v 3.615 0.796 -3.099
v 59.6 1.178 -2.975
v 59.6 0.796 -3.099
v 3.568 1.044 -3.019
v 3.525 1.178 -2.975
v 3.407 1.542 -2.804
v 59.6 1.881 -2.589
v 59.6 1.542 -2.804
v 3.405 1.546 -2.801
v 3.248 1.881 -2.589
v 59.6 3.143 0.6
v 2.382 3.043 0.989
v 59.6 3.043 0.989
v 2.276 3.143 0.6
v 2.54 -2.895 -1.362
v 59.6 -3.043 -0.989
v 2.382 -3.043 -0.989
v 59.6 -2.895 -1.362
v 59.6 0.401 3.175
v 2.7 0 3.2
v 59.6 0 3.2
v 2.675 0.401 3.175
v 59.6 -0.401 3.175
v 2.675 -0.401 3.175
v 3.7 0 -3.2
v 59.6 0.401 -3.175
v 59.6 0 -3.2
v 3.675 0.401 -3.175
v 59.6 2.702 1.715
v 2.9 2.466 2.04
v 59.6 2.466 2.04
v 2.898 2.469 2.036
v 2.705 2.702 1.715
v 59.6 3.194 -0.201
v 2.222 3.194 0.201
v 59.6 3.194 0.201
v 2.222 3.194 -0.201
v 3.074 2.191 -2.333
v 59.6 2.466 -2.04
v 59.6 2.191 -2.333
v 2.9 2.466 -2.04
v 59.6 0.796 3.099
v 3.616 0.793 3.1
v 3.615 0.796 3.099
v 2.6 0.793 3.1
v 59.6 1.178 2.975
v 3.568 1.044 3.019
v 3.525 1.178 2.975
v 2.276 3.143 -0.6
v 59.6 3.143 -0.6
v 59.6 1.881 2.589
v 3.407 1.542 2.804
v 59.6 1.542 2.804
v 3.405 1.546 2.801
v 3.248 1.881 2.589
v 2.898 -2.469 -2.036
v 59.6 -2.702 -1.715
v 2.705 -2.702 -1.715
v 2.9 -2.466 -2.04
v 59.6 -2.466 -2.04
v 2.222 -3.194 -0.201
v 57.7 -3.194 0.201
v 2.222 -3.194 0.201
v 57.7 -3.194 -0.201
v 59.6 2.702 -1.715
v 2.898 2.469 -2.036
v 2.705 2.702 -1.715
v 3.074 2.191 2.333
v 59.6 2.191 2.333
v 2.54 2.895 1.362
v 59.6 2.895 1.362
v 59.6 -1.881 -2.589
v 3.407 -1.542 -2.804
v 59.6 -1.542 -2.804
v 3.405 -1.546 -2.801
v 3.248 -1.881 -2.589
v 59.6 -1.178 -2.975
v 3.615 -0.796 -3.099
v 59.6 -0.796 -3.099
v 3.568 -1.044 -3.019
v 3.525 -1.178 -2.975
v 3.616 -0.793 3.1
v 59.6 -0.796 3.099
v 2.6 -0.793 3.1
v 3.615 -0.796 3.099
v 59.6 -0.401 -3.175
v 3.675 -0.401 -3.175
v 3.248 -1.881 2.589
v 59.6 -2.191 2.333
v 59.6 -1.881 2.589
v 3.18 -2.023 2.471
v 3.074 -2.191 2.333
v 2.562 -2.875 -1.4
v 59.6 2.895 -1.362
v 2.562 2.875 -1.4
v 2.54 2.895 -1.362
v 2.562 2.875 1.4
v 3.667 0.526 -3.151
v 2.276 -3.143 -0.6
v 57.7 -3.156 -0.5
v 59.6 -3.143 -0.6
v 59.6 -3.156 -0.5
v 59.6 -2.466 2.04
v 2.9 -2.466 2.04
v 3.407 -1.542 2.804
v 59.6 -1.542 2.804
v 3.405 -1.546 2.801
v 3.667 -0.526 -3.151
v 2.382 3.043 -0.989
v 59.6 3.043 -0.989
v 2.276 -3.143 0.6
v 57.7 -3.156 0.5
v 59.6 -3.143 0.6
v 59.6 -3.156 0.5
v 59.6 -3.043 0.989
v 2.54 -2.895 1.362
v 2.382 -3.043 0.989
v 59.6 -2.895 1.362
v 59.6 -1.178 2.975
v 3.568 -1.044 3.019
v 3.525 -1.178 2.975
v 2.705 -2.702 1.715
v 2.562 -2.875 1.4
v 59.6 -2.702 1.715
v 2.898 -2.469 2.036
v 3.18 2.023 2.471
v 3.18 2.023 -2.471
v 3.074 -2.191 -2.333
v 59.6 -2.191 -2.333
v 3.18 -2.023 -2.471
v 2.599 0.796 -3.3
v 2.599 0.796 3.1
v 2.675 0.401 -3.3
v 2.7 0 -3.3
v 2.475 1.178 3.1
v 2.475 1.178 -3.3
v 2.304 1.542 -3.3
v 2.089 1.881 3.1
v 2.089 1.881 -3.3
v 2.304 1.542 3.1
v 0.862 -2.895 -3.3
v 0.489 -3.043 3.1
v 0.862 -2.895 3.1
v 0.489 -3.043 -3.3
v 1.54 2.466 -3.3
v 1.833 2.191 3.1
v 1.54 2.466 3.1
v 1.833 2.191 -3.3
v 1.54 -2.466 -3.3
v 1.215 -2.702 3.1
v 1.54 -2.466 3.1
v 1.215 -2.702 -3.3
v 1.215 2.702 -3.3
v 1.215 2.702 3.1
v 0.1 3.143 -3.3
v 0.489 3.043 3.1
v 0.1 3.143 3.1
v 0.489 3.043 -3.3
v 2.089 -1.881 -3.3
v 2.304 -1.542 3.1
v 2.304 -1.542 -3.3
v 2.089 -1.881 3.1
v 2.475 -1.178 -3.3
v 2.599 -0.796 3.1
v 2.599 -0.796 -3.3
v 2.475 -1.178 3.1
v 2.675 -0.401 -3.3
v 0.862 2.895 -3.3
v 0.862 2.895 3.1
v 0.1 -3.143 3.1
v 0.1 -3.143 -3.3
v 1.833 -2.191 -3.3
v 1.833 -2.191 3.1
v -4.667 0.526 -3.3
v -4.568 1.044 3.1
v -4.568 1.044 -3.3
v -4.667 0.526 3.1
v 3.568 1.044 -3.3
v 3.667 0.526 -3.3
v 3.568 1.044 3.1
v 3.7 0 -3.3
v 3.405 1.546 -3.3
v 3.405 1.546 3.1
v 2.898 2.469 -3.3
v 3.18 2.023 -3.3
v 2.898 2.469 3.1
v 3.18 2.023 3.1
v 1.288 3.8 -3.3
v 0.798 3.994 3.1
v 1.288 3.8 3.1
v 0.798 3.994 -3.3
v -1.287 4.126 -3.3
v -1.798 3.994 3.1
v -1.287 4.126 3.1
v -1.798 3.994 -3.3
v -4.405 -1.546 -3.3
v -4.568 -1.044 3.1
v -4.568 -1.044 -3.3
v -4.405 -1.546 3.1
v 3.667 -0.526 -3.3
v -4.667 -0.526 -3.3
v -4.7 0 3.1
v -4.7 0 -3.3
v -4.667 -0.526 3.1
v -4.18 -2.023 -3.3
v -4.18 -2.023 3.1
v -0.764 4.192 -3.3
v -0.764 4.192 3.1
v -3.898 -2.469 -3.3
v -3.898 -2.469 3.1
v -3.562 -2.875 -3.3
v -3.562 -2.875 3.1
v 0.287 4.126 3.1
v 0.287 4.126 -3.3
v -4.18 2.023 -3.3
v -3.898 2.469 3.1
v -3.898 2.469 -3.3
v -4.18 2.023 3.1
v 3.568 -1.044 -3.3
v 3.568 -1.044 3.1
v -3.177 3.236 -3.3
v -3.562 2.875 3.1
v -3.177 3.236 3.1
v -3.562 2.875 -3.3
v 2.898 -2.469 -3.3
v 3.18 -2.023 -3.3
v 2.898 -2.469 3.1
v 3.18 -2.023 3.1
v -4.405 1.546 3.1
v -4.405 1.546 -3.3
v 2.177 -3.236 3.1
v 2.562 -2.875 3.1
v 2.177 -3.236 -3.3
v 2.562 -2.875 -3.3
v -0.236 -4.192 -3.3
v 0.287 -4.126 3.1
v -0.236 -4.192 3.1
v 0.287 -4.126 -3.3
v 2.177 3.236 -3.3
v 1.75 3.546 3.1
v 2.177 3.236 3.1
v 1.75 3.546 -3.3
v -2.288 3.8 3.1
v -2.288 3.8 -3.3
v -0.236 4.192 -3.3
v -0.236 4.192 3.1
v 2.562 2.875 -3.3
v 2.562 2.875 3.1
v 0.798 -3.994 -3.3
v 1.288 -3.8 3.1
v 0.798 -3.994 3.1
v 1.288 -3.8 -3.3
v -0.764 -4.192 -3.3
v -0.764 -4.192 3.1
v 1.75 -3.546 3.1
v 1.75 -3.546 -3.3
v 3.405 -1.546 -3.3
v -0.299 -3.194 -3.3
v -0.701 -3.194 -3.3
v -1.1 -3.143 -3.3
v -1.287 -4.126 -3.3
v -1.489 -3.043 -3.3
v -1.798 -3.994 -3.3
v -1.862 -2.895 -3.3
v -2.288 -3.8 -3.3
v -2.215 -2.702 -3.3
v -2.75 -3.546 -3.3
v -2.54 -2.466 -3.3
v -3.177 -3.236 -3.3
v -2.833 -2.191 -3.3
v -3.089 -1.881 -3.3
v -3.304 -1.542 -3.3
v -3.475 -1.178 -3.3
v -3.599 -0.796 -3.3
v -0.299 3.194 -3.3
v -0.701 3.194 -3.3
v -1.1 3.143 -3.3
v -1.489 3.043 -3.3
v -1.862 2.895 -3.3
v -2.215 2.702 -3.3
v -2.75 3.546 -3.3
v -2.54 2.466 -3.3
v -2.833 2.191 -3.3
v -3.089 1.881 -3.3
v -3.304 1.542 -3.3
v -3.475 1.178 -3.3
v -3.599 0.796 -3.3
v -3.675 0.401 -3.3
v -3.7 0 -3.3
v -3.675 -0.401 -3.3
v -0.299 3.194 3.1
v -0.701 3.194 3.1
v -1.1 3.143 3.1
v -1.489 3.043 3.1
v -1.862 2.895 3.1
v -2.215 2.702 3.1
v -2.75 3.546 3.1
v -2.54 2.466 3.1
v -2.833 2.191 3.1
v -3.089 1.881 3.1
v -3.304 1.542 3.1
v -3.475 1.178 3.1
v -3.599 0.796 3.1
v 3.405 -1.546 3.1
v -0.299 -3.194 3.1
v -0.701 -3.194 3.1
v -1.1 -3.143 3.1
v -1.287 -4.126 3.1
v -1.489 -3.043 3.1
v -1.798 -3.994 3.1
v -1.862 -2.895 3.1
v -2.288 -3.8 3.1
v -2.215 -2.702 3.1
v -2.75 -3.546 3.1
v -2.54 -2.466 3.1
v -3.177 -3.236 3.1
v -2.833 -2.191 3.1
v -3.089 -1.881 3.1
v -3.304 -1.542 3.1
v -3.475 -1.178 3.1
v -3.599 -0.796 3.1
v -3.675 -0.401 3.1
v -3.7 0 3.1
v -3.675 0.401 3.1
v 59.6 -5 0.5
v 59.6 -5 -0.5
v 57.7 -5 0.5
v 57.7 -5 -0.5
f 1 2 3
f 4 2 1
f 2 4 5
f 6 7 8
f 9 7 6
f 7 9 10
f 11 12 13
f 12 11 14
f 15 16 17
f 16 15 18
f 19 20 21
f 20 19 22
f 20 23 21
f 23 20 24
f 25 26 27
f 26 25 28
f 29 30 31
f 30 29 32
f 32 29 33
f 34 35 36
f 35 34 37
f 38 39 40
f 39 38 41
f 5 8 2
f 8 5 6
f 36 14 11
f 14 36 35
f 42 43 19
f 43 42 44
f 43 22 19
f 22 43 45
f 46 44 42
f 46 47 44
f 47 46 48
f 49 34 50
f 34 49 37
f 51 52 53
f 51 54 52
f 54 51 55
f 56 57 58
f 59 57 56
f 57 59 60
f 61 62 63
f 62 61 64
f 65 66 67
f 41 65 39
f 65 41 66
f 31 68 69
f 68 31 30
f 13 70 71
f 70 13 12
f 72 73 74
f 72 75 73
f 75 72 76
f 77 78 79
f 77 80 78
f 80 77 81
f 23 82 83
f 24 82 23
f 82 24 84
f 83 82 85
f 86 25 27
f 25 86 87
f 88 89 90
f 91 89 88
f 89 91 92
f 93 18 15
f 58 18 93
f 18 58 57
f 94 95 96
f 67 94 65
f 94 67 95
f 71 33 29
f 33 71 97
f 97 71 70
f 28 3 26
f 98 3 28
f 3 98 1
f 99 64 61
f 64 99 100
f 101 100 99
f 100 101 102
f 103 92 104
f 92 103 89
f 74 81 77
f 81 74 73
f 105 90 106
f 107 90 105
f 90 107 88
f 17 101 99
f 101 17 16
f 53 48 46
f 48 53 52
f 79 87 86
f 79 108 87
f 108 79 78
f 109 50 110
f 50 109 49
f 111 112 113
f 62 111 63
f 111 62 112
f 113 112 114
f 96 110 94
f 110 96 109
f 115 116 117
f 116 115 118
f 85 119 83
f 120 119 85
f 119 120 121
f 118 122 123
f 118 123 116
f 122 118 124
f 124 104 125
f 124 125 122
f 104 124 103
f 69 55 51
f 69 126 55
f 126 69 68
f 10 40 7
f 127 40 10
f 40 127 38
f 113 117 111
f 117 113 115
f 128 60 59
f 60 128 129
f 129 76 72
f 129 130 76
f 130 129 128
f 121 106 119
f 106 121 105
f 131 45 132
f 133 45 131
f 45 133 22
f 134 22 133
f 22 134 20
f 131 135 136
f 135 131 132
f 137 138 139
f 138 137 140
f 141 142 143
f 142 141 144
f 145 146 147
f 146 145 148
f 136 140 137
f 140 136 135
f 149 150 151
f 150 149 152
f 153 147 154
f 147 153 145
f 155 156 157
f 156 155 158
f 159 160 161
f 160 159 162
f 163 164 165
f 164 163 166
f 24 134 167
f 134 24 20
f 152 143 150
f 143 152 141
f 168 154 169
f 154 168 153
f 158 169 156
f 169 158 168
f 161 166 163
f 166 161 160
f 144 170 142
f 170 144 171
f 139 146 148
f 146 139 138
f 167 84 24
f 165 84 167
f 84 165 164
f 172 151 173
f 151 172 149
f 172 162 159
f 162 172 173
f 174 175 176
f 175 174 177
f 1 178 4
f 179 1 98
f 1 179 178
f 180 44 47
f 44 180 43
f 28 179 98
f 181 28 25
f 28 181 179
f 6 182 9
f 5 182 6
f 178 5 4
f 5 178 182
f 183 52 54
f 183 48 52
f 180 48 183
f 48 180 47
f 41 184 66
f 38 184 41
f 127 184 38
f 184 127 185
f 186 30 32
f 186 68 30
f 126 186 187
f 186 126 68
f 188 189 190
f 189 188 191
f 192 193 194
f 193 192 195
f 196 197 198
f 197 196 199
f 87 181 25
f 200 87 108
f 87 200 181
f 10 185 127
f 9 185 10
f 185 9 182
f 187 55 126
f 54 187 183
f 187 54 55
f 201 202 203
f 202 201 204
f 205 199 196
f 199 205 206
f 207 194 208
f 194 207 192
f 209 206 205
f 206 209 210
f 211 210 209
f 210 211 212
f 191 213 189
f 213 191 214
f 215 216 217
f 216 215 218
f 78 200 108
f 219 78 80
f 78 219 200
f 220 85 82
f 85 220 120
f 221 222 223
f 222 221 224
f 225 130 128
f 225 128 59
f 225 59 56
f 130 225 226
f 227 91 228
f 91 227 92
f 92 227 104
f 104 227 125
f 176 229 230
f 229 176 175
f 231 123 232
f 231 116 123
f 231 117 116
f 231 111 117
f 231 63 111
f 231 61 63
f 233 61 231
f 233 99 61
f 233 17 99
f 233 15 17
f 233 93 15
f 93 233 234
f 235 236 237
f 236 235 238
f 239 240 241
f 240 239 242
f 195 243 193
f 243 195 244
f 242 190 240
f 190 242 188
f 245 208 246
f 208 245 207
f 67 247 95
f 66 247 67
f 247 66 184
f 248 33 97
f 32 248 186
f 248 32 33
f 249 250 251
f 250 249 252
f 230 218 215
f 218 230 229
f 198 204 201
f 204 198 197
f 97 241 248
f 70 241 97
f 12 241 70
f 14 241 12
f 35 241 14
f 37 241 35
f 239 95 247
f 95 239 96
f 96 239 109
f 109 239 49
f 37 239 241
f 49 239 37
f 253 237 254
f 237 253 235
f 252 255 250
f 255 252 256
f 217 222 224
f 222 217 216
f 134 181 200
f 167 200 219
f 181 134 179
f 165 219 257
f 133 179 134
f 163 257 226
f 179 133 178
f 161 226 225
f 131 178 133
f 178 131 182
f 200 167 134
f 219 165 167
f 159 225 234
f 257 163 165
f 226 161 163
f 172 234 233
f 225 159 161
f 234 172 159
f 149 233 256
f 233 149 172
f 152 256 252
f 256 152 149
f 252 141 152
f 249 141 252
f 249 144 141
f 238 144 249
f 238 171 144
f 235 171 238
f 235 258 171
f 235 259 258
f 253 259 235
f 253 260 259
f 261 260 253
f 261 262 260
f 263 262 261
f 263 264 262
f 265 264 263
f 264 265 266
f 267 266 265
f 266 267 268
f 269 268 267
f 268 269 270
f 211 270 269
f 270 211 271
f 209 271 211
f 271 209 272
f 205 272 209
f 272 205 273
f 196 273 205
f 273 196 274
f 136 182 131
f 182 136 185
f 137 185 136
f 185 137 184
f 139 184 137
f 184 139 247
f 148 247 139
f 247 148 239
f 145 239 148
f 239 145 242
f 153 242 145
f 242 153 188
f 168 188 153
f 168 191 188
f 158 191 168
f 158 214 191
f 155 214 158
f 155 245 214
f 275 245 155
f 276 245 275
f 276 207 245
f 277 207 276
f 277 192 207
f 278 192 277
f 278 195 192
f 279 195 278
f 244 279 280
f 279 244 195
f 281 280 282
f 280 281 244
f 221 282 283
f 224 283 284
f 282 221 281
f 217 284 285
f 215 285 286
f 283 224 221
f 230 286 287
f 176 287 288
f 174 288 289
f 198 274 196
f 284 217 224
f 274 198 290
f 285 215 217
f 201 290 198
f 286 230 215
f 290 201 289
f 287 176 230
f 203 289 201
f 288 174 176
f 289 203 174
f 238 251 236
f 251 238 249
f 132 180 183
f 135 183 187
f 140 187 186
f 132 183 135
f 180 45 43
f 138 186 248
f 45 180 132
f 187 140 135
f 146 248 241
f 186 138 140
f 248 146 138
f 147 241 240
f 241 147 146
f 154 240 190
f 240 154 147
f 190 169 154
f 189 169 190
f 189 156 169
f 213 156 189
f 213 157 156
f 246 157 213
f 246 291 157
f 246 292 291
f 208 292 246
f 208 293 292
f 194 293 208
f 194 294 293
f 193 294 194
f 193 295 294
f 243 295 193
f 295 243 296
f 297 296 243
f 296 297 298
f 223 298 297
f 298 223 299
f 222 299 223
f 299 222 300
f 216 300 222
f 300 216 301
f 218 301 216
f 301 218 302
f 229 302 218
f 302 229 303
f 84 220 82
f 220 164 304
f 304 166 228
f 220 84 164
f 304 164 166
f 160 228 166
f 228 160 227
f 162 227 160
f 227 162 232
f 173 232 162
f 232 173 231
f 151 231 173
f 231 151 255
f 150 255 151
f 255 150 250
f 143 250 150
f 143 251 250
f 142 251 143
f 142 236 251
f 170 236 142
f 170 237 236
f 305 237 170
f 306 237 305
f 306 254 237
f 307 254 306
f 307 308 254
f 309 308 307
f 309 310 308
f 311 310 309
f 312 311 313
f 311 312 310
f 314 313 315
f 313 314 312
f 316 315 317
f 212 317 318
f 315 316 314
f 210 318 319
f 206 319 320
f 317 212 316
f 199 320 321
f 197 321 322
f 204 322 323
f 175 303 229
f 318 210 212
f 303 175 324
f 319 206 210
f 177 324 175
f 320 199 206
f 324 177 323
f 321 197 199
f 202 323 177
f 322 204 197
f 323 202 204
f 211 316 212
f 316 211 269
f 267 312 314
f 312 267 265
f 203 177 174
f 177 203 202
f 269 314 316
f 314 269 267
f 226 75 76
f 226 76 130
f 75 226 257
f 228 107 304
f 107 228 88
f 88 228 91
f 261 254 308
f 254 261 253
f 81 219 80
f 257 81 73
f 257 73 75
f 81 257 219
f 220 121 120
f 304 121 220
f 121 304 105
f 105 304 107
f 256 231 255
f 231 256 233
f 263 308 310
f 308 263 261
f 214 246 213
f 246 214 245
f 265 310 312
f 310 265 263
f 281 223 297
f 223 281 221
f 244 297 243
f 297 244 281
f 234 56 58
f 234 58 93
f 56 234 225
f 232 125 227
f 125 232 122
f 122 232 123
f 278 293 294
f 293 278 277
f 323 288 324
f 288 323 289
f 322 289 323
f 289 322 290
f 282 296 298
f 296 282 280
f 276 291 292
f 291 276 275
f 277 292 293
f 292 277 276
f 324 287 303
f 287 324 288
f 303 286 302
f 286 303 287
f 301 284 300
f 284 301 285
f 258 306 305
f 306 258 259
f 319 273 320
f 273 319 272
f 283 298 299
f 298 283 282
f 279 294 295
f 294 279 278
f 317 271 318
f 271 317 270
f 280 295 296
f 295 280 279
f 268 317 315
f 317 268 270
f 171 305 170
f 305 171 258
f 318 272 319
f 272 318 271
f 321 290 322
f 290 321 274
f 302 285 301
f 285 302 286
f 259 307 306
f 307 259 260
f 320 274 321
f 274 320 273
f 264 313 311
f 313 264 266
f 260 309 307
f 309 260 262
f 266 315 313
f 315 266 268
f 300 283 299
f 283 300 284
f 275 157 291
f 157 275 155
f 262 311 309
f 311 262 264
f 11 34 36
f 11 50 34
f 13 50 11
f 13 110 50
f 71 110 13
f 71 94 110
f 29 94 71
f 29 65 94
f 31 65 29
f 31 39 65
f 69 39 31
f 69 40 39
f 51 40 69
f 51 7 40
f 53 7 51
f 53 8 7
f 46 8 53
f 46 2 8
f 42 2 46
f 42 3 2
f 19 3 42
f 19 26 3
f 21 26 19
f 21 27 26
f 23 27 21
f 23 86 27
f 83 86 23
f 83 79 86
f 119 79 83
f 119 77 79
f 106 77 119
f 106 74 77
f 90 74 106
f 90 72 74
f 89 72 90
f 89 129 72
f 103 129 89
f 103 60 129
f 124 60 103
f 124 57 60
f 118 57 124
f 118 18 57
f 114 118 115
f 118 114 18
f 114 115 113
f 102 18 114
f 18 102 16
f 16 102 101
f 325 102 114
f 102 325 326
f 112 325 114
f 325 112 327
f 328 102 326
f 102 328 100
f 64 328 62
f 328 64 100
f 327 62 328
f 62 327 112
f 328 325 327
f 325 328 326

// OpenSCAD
// file: ../robot_settings.scad
main_box_x = 95; // 96
main_box_y = 102;
main_box_z = 74; // 74.5
wall_thickness = 2;

rail_gap = 2;
rail_inset = 7;

rail_thickness = 7;
rail_length = 250;
rail_width = 200;

raspberry_pi_screw_seperation_y = 57;
raspberry_pi_screw_seperation_z = 48;
raspberry_pi_peg_h = 5;

battery_box_peg_h = 6;
battery_box_peg_d = 8;
battery_box_peg_cutout = 5;

gears_module = 1;
pinion_gear_teeth = 32;
pinion_gear_width = 5;
pinion_gear_bore = 8;

gears_setback_distance = 25;
gear_post_height = 2 * pinion_gear_width + rail_thickness + 8 ;

steering_motor_mount_x = 45;
steering_motor_mount_y = 36;
steering_motor_mount_z = 18;
steering_motor_mount_setback_distance = gears_setback_distance + 16;

dc_motor_drivertype = "Teyleten"; // Teyleten
isAdafruit = (dc_motor_drivertype == "Adafruit");

drv8871_x = isAdafruit ? 20.3 : 21.6;
drv8871_y = isAdafruit ?  24 : 25;

drv8871_z = 2;
drv8871_screw_d = 2.5;
drv8871_solder_points_z = 2;

drv8871mount_edge_x = 1.5;
drv8871mount_edge_wall = 3;
drv8871mount_z = 5;
drv8871mount_x = drv8871_x +  drv8871mount_edge_wall - 2* drv8871mount_edge_x;
drv8871mount_y = 19;

drv8871_screw_distance = 15.64;
drv8871_solder_points_d = 1.66;
drv8871_solder_offset_y = 4.4;
drv8871_solder_inner_points_distance = 5;
drv8871_solder_outer_points_distance = 12;

dc_motor_housing_minus_encoder_z = 48;
dc_motor_encoder_z = 9.33;
dc_motor_encoder_wheel_d = 13.4;
dc_motor_encoder_wheel_thickness = 5;
dc_motor_encoder_wheel_gap = 3;
dc_motor_encoder_circuit_thickness = 2;
dc_motor_cutout_d = 24.8;
dc_motor_cutout_z = 19.5;

dc_motor_screw_head_z = 2;
dc_motor_screw_head_d = 5.6;
dc_motor_screw_d = 3.2;
dc_motor_screw_offset = 8.5;

dc_motor_axle_ring_z = 3;
dc_motor_axle_ring_d = 7.2;
dc_motor_axle_cutout_d = 4.5;
dc_motor_axle_cutout_z = 10;
dc_motor_axle_notch_cutout = 0.4;
dc_motor_axle_notch_cutout_z = 6;

pdmount_x = 20;
pdmount_y = 30;
pdmount_z = 2;
pdmount_edge_x = 1.5;
pdmount_edge_wall = 3;

steering_shaft_z = 45;
steering_shaft_d = 7;
steering_shaft_motor_fitting_d = 9;
coupler_length = 24.6;
coupler_diameter = 14;
coupler_screw_d = 4;
coupler_screw_z_offset = 5;
coupler_gear_side_insert = 12.6;
steering_shaft_with_coupler_z = steering_shaft_z - coupler_gear_side_insert;

lidar_mount_y = 110;
lidar_mount_x = 65 + 20;
lidar_narrow_screws = 40;
lidar_wide_screws = 56;
lidar_front_to_back_screws = 70;
lidar_screw_d = 3;
lidar_circuitboard_x = 20;
lidar_circuitboard_y = 35;
lidar_circuitboard_z = 1.2;
lidar_cord_length = 29;

ball_bearing_height = 7;
ball_bearing_outer_diameter = 22;
ball_bearing_inner_diameter = 8;

 armature_holder_height = 20;
 armature_holder_thickness = 8;
pull_bar_peg_r = 3.2;
apparatus_locking_peg_d = 4;

rack_module = 1;
rack_length = main_box_x / 2;
rack_height = 10;
rack_width = 10;
rack_teeth = 30;
rack_bore = 3;

pull_bar_length = rail_width / 2 - rack_length + 1;

// tire hardware
axle_length = 30;
axle_reciever_inner_diameter = 7.75;
axle_reciever_length = 18.8;
axle_notch_length = 7;
axle_notch_cutout = 2.4;

// power distribution bar
power_bar_cutout_x = 96;
power_bar_y = 19.1;
power_bar_z = 1.5;
power_bar_screw_distance = 91.4;
power_bar_screw_d = 2.8;
power_bar_standoff_z = 5;
power_bar_standoff_d = 6.83;

// breadboard
breadboard_wall_thickness = 3;
breadboard_width = 55;
breadboard_length = 83;
breadboard_height = 10.5;
breadboard_notch_width = 4.2;
breadboard_longside_notch_separation = 58.2 - breadboard_notch_width / 2;
breadboard_shortside_notch_separation = 26.3 - breadboard_notch_width;

pico_expander_width = 63;
pico_expander_height = 57;
pico_screw_hole_offset = 3;
pico_screw_hole_d = 2.5;

usbhub_thickness = 11.7;
usbhub_depth = 37.5;
usbhub_width = 86.7;
usbhub_end_port_width = 14.8;
usbhub_end_port_height = 12;
usbhub_front_face_safe_zone_left = 15;
usbhub_front_face_safe_zone_right = 14.8;

switch_w = 16;
switch_cutout_d = 12.2;
switch_bump_h = 2;
switch_bump_l = 18.2;
// main file
include <../robot_settings.scad>
$fn = 50;

module pull_bar(rotateit = false, bar_length_offset = 0) {
    rotation = rotateit ? 180 : 0;
  
    rotate([0,rotation,0])
    {
        // push bar
        difference() {
            rotate([0, 90, 0])
            cylinder(h = pull_bar_length + bar_length_offset, r = pull_bar_peg_r);
            translate([-.5, 0, -pull_bar_peg_r])
            cylinder(h = 2 * pull_bar_peg_r, r = pull_bar_peg_r);
          }
          
           if (rotation == 0 ){
              translate([pull_bar_length + bar_length_offset + 2 * pull_bar_peg_r - 2.2,  -pull_bar_peg_r - 1.8, -0.5])
              cube([1.9, 2.8, 1]);
           }
          else
          {
              translate([pull_bar_length + bar_length_offset + 2 * pull_bar_peg_r - 2.2,  -pull_bar_peg_r - 1.8, -0.5])
              cube([1.9, 2.8, 1]);
           }
           
          // rack fitting
          translate([pull_bar_length + bar_length_offset - .1, 0, 0])
            rotate([0, 90 ,0])
            cylinder(h = 2 * pull_bar_peg_r - .2, d = 2 * pull_bar_peg_r);

          // grabber
          translate([-.5, 0, -1.1])
          difference() {
              translate([0, 0, 1 - pull_bar_peg_r])
              cylinder(h = 2 * pull_bar_peg_r, r = pull_bar_peg_r + 1);
          
              translate([0, 0,  -pull_bar_peg_r])
              cylinder(h = 3* pull_bar_peg_r, r = pull_bar_peg_r);
         }
    }
                

}
pull_bar();
